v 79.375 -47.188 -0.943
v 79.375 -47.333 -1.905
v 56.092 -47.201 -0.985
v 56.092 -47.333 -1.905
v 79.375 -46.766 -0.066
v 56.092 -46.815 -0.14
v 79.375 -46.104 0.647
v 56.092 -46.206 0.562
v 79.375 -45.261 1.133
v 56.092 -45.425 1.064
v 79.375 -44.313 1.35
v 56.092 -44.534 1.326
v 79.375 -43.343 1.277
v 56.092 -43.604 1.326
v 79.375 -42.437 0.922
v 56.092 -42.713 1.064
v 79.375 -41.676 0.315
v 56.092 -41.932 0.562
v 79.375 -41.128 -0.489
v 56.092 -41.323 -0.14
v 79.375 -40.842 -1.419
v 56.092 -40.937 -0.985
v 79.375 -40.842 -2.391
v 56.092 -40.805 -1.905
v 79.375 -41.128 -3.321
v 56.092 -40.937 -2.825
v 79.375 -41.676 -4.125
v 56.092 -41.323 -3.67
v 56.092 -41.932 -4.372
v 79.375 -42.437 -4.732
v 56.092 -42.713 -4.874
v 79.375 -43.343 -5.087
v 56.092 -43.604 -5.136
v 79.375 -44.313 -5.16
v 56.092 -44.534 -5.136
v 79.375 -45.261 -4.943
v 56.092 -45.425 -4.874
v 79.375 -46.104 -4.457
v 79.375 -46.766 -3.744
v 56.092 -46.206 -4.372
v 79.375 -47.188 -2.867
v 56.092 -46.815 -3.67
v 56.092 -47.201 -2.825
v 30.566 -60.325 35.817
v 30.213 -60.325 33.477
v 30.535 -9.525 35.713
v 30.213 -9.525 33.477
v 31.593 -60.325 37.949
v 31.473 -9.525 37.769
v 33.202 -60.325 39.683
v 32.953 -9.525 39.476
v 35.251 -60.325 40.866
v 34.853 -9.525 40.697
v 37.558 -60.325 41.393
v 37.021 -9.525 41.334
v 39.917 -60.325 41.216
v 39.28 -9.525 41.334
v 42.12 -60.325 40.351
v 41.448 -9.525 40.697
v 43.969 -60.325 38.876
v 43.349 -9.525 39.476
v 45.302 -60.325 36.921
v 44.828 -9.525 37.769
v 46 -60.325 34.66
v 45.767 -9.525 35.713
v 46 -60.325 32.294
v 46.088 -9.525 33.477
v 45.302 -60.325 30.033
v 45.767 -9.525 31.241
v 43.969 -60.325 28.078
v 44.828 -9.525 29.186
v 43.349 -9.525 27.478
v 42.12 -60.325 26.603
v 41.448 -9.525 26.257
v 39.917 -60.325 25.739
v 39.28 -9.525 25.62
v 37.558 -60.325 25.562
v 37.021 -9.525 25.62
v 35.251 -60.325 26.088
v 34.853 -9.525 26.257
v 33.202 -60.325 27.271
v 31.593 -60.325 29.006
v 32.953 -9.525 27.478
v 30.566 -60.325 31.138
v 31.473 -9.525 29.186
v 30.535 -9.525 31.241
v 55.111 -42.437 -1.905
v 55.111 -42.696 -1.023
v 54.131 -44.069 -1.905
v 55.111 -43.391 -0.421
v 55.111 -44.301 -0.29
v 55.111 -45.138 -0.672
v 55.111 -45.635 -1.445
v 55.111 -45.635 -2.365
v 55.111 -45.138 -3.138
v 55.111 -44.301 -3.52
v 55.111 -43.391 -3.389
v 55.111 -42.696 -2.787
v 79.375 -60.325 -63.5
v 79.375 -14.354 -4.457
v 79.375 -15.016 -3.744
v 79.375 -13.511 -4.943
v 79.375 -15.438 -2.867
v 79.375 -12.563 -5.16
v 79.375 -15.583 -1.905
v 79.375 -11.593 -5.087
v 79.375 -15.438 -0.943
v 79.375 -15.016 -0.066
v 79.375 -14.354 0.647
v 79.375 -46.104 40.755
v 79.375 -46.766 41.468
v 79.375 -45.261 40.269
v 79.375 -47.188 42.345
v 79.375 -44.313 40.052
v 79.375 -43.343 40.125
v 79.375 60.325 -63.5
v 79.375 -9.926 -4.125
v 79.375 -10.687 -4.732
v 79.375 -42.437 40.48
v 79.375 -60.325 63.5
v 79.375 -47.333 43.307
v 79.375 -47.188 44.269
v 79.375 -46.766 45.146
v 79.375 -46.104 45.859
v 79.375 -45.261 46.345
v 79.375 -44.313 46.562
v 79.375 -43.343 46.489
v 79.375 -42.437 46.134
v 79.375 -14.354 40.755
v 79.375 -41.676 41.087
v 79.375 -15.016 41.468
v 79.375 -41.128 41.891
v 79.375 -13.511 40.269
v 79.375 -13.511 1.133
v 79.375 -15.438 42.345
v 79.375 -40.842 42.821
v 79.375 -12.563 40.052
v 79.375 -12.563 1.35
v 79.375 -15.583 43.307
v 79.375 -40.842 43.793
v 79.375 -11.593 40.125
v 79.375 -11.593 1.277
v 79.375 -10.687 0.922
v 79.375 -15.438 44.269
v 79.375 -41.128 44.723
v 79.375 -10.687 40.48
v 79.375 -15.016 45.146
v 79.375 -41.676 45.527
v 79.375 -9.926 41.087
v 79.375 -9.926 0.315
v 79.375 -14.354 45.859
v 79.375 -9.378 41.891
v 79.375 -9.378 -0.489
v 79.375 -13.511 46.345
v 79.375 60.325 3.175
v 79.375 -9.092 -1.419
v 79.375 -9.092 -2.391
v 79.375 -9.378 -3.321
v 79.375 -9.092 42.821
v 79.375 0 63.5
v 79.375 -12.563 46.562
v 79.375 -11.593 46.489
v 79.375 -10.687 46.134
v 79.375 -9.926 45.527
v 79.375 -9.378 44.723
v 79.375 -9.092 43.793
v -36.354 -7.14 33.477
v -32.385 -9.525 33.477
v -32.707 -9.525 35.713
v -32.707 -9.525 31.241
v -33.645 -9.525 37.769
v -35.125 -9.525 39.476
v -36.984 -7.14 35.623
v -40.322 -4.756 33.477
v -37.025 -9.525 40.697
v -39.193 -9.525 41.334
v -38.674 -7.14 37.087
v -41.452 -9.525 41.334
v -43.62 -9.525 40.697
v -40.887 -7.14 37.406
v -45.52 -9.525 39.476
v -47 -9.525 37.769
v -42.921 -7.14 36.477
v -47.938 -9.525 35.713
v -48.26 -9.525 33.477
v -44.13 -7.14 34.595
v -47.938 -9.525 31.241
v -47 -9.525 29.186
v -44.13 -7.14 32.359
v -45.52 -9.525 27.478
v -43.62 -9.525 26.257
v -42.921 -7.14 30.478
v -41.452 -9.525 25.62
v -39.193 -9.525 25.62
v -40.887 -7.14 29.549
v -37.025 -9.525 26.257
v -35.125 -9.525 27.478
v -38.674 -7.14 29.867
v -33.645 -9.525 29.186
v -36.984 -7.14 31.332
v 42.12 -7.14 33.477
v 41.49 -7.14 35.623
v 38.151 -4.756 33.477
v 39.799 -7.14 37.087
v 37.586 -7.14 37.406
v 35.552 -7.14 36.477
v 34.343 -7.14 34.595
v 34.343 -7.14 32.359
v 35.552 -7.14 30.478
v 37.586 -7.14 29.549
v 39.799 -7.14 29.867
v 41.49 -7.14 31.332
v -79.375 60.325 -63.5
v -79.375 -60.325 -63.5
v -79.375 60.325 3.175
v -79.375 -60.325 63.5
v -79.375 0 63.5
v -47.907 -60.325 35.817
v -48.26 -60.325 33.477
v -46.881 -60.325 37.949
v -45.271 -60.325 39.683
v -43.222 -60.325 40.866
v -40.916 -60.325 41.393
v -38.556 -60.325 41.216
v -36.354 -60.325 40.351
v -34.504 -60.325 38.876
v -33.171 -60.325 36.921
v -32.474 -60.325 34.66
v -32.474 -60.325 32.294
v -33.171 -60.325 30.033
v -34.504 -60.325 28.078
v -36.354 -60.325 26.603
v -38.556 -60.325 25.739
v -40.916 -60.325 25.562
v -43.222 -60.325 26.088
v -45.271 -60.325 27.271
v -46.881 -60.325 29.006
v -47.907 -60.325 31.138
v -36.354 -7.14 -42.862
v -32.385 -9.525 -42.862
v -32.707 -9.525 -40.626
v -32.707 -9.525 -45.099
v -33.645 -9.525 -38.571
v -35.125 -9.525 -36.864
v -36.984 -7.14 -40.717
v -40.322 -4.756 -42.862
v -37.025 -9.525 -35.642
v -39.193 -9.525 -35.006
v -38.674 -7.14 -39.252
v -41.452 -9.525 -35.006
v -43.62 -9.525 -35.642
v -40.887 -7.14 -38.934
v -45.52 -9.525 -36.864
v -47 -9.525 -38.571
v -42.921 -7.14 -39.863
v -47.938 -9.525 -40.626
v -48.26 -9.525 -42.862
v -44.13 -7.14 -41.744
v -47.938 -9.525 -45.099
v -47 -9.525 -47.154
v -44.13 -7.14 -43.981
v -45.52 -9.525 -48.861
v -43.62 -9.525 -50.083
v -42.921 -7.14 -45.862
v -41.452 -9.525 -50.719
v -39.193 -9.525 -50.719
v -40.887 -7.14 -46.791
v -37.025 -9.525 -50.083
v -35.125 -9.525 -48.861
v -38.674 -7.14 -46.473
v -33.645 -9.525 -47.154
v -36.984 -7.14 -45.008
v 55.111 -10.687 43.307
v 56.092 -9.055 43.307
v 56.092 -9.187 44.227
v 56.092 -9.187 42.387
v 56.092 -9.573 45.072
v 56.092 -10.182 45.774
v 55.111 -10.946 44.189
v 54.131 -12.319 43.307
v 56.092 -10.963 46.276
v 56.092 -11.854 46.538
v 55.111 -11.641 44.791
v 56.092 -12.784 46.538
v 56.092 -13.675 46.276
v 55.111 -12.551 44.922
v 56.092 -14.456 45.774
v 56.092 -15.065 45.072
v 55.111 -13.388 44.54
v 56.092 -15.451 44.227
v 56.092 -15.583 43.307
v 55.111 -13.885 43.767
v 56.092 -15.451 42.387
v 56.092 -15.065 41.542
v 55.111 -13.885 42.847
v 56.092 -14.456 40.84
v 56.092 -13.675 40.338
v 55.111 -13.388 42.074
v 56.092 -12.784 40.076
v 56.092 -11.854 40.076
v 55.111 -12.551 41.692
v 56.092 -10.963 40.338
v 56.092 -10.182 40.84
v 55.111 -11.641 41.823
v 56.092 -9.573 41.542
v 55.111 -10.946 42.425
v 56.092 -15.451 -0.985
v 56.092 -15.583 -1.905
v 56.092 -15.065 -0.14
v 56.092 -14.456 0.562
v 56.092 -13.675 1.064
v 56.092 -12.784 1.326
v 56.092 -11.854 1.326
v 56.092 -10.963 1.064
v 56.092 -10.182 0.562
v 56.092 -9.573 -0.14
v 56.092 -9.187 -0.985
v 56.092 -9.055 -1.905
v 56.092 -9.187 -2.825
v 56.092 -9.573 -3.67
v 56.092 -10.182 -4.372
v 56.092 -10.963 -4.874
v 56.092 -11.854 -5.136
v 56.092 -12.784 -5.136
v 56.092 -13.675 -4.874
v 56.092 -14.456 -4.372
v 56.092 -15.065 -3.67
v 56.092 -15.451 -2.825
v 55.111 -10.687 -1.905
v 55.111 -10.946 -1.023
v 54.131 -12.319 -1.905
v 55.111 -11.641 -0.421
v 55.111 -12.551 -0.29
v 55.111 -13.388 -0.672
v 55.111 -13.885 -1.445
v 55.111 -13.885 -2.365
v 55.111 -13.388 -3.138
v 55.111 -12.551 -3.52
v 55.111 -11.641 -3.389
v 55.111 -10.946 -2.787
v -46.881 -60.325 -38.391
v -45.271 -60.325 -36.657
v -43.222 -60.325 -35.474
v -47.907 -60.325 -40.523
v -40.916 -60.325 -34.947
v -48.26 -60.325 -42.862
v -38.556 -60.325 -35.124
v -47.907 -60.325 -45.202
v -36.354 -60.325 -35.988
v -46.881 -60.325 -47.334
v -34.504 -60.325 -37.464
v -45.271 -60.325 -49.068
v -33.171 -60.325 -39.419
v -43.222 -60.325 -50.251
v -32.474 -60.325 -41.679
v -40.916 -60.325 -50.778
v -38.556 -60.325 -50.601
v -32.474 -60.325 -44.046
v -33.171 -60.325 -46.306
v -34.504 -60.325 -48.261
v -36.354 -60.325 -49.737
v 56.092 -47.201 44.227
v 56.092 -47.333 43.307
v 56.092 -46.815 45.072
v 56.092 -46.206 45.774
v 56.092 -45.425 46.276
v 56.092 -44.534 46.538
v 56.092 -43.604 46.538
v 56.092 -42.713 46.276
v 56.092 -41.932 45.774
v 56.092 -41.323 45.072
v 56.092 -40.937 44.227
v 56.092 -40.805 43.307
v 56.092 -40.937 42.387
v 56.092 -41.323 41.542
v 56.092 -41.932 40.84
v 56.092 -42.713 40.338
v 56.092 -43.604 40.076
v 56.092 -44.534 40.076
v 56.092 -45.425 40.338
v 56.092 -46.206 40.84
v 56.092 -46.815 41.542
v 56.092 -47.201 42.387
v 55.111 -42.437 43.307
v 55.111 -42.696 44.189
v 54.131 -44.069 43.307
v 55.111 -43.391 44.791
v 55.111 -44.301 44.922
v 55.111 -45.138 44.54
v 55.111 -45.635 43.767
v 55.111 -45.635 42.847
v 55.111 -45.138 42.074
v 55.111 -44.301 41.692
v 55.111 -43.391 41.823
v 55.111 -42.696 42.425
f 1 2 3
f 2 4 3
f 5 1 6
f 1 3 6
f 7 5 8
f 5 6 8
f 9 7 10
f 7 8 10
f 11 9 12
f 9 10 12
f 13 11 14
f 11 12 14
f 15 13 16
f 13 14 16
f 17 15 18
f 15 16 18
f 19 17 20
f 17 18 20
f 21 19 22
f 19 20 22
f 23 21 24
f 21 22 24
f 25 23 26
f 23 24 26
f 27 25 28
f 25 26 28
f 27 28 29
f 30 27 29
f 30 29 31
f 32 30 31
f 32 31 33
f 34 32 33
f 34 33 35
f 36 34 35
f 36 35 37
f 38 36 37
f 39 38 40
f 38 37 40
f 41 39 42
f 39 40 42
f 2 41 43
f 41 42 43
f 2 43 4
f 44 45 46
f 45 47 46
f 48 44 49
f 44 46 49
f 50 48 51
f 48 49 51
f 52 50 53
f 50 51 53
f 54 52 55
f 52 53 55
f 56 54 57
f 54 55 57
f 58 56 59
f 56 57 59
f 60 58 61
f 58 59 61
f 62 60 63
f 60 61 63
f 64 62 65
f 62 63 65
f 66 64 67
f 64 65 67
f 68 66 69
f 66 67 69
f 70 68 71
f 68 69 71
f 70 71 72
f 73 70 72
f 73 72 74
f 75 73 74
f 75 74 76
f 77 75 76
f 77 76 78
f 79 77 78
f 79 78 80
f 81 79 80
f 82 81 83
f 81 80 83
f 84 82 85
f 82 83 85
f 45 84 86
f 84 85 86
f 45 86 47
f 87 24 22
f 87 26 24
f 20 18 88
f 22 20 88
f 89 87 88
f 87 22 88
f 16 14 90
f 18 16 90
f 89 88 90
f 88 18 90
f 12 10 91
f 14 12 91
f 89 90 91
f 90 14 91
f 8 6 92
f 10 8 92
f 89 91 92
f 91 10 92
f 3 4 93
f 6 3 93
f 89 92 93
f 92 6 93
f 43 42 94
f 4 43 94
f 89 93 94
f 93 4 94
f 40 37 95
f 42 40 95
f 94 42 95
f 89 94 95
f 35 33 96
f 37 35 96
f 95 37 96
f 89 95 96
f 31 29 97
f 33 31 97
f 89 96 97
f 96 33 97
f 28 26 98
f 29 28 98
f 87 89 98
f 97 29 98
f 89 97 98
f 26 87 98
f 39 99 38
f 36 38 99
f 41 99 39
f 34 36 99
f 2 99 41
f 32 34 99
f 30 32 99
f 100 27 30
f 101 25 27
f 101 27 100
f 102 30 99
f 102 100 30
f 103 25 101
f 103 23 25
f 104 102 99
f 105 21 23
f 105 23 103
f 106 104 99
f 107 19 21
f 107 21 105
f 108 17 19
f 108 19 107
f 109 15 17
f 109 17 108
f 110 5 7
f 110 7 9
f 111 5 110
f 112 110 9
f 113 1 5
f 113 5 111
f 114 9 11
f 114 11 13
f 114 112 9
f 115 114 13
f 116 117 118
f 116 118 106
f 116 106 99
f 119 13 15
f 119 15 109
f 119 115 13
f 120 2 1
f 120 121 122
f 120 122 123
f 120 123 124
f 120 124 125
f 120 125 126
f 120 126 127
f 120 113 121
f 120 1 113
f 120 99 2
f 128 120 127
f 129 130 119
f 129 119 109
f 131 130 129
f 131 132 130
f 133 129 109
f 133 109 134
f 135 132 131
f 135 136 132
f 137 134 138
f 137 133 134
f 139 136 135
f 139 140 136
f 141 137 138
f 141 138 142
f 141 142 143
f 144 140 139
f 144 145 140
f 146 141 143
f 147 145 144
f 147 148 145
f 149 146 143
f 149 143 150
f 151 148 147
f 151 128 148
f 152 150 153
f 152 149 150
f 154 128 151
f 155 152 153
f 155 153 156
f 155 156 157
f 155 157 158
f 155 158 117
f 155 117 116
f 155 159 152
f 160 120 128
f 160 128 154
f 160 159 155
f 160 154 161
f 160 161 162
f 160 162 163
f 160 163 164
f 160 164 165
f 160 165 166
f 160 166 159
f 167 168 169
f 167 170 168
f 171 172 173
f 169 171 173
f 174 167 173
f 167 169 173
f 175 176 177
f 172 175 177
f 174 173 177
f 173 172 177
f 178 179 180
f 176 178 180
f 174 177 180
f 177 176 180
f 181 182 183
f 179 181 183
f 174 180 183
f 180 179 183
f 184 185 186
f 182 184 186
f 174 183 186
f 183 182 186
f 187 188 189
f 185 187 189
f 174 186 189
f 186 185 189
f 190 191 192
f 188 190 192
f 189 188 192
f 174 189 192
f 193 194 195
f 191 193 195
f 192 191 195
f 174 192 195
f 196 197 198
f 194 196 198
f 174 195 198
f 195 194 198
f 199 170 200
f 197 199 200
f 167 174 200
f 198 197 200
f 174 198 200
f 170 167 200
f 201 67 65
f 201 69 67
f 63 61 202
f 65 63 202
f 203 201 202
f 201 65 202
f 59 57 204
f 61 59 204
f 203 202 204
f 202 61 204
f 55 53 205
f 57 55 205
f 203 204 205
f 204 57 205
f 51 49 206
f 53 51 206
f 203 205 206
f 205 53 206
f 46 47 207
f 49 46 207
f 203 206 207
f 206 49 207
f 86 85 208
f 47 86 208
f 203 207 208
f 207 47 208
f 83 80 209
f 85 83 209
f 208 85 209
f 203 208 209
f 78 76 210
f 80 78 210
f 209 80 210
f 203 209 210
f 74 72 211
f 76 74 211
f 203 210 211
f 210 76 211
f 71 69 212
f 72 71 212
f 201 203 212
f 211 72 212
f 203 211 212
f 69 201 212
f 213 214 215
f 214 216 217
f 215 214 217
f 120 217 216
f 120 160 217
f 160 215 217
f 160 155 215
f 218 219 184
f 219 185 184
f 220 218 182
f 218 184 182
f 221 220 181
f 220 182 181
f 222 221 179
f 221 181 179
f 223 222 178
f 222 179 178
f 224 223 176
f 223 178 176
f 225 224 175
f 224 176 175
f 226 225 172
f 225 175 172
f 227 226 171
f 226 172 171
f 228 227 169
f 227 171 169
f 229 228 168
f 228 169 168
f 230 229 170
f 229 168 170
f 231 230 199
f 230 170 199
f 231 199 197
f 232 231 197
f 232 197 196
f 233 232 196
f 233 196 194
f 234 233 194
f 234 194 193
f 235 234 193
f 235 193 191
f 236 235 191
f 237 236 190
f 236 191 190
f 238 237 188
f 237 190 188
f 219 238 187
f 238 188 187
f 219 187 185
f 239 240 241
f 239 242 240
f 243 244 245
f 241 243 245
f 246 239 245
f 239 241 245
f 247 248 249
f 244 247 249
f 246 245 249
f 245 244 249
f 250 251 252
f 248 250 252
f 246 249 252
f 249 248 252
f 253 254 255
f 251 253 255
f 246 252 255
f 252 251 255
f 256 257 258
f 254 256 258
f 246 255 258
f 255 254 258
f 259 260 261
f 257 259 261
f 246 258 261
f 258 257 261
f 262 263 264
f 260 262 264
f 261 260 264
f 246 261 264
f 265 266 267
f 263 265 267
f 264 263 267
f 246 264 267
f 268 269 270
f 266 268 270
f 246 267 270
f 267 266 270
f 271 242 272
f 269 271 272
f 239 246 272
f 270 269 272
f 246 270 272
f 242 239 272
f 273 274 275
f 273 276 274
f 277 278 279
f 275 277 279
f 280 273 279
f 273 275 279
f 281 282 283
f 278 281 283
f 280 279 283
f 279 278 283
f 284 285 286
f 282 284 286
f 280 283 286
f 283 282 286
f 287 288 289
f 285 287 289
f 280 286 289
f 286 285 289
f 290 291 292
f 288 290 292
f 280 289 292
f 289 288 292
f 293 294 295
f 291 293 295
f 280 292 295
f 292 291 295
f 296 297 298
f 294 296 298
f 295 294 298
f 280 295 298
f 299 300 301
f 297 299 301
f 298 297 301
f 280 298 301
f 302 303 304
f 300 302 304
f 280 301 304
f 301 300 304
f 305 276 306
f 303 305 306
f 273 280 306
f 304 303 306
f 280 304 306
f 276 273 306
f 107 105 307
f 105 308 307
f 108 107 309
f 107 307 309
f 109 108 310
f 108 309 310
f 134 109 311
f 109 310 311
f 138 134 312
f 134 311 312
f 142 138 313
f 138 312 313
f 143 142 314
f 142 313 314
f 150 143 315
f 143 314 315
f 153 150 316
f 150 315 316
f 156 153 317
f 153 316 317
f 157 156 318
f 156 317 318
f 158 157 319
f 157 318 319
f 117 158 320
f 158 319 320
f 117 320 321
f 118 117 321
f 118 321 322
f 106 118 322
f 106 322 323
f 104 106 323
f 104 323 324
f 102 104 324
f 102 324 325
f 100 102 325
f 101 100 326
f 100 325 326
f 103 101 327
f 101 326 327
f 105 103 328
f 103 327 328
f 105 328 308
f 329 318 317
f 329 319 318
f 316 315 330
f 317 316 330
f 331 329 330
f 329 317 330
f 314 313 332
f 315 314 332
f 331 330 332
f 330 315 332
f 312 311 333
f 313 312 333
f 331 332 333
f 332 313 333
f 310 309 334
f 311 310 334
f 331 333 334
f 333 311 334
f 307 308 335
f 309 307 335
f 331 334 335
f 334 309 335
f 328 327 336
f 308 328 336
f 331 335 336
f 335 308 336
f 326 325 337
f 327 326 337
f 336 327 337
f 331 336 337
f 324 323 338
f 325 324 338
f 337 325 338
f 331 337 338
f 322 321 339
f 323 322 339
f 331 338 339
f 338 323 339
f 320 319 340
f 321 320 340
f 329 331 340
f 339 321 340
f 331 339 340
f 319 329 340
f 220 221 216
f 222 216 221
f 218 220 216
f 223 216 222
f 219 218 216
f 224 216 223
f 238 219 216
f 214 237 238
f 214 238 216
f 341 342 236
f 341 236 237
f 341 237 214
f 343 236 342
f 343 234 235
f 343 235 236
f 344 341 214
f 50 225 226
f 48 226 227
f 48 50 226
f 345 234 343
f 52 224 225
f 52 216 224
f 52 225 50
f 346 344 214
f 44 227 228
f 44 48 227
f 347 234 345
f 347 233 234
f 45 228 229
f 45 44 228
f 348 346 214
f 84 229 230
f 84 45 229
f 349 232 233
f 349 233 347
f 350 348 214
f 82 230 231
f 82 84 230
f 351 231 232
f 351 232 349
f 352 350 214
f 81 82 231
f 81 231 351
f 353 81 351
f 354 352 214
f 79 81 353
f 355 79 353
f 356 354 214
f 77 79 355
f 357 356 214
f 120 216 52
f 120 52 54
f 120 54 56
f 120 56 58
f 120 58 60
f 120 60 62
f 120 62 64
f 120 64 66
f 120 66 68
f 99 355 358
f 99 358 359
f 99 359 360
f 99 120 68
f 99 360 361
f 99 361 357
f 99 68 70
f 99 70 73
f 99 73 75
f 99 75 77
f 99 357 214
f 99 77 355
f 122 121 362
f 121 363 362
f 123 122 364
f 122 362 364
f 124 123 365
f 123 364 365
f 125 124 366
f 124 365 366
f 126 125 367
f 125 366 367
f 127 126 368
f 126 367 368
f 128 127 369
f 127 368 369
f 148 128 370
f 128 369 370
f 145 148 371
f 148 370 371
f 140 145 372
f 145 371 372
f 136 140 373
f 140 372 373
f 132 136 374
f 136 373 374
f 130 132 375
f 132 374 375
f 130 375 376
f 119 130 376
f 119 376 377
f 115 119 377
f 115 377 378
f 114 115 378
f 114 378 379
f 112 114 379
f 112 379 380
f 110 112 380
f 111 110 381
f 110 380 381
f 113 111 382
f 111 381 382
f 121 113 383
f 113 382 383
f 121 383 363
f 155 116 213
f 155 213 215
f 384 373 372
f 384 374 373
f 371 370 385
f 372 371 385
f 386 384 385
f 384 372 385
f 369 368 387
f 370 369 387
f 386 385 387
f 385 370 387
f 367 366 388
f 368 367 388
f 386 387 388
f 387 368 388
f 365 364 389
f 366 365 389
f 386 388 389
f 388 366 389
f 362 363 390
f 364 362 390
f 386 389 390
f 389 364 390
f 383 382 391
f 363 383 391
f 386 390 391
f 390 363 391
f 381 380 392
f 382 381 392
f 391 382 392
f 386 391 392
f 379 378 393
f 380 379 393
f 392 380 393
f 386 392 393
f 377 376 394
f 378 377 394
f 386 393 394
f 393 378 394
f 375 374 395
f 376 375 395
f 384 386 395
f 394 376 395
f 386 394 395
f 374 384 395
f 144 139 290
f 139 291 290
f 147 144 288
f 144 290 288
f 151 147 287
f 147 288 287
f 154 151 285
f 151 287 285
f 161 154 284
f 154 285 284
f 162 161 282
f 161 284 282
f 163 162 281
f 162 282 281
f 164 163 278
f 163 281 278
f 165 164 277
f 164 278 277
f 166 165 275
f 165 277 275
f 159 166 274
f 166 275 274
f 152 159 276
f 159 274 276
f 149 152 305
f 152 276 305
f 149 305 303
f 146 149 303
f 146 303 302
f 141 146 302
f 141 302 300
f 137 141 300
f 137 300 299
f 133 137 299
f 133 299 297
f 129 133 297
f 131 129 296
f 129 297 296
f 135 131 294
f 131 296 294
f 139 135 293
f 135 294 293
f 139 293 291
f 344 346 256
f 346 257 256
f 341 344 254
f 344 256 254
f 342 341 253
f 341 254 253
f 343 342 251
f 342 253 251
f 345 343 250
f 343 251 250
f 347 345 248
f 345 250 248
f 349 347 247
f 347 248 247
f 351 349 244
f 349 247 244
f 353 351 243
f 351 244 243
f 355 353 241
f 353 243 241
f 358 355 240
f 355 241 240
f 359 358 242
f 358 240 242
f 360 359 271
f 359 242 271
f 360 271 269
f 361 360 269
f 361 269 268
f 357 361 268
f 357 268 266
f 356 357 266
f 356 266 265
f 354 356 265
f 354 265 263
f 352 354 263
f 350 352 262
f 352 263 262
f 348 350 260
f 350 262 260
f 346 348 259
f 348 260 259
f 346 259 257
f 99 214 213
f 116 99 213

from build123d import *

# Parameters (mm, degrees)
F1_DEPTH = 79.375
F3_D     = 15.875
F3_DEPTH = 50.8
F3_TIP   = 4.7693311635
F5_D     = 6.5278
F5_DEPTH = 23.2833333333
F5_TIP   = 1.9611489744


with BuildPart() as f1:
    # F0 (on Right) → F1 (new body, symmetric)
    with BuildSketch(Plane.YZ):
        Polygon((-60.325, 63.5), (-60.325, -63.5), (60.325, -63.5), (60.325, 3.175), (0, 63.5), align=None)
    extrude(amount=F1_DEPTH, both=True)

    # F3
    with Locations(Plane.XZ.offset(60.325)):
        with Locations((-40.3225, -42.8625), (-40.3225, 33.4772), (38.1508, 33.4772)):
            Hole(F3_D / 2, depth=F3_DEPTH)
            with Locations((0, 0, -(F3_DEPTH + F3_TIP / 2))):  # 118° drill point
                Cone(0, F3_D / 2, F3_TIP, mode=Mode.SUBTRACT)

    # F5
    with Locations(Plane.YZ.offset(79.375)):
        with Locations((-44.069, 43.307), (-44.069, -1.905), (-12.319, -1.905), (-12.319, 43.307)):
            Hole(F5_D / 2, depth=F5_DEPTH)
            with Locations((0, 0, -(F5_DEPTH + F5_TIP / 2))):  # 118° drill point
                Cone(0, F5_D / 2, F5_TIP, mode=Mode.SUBTRACT)


solid = f1.part
